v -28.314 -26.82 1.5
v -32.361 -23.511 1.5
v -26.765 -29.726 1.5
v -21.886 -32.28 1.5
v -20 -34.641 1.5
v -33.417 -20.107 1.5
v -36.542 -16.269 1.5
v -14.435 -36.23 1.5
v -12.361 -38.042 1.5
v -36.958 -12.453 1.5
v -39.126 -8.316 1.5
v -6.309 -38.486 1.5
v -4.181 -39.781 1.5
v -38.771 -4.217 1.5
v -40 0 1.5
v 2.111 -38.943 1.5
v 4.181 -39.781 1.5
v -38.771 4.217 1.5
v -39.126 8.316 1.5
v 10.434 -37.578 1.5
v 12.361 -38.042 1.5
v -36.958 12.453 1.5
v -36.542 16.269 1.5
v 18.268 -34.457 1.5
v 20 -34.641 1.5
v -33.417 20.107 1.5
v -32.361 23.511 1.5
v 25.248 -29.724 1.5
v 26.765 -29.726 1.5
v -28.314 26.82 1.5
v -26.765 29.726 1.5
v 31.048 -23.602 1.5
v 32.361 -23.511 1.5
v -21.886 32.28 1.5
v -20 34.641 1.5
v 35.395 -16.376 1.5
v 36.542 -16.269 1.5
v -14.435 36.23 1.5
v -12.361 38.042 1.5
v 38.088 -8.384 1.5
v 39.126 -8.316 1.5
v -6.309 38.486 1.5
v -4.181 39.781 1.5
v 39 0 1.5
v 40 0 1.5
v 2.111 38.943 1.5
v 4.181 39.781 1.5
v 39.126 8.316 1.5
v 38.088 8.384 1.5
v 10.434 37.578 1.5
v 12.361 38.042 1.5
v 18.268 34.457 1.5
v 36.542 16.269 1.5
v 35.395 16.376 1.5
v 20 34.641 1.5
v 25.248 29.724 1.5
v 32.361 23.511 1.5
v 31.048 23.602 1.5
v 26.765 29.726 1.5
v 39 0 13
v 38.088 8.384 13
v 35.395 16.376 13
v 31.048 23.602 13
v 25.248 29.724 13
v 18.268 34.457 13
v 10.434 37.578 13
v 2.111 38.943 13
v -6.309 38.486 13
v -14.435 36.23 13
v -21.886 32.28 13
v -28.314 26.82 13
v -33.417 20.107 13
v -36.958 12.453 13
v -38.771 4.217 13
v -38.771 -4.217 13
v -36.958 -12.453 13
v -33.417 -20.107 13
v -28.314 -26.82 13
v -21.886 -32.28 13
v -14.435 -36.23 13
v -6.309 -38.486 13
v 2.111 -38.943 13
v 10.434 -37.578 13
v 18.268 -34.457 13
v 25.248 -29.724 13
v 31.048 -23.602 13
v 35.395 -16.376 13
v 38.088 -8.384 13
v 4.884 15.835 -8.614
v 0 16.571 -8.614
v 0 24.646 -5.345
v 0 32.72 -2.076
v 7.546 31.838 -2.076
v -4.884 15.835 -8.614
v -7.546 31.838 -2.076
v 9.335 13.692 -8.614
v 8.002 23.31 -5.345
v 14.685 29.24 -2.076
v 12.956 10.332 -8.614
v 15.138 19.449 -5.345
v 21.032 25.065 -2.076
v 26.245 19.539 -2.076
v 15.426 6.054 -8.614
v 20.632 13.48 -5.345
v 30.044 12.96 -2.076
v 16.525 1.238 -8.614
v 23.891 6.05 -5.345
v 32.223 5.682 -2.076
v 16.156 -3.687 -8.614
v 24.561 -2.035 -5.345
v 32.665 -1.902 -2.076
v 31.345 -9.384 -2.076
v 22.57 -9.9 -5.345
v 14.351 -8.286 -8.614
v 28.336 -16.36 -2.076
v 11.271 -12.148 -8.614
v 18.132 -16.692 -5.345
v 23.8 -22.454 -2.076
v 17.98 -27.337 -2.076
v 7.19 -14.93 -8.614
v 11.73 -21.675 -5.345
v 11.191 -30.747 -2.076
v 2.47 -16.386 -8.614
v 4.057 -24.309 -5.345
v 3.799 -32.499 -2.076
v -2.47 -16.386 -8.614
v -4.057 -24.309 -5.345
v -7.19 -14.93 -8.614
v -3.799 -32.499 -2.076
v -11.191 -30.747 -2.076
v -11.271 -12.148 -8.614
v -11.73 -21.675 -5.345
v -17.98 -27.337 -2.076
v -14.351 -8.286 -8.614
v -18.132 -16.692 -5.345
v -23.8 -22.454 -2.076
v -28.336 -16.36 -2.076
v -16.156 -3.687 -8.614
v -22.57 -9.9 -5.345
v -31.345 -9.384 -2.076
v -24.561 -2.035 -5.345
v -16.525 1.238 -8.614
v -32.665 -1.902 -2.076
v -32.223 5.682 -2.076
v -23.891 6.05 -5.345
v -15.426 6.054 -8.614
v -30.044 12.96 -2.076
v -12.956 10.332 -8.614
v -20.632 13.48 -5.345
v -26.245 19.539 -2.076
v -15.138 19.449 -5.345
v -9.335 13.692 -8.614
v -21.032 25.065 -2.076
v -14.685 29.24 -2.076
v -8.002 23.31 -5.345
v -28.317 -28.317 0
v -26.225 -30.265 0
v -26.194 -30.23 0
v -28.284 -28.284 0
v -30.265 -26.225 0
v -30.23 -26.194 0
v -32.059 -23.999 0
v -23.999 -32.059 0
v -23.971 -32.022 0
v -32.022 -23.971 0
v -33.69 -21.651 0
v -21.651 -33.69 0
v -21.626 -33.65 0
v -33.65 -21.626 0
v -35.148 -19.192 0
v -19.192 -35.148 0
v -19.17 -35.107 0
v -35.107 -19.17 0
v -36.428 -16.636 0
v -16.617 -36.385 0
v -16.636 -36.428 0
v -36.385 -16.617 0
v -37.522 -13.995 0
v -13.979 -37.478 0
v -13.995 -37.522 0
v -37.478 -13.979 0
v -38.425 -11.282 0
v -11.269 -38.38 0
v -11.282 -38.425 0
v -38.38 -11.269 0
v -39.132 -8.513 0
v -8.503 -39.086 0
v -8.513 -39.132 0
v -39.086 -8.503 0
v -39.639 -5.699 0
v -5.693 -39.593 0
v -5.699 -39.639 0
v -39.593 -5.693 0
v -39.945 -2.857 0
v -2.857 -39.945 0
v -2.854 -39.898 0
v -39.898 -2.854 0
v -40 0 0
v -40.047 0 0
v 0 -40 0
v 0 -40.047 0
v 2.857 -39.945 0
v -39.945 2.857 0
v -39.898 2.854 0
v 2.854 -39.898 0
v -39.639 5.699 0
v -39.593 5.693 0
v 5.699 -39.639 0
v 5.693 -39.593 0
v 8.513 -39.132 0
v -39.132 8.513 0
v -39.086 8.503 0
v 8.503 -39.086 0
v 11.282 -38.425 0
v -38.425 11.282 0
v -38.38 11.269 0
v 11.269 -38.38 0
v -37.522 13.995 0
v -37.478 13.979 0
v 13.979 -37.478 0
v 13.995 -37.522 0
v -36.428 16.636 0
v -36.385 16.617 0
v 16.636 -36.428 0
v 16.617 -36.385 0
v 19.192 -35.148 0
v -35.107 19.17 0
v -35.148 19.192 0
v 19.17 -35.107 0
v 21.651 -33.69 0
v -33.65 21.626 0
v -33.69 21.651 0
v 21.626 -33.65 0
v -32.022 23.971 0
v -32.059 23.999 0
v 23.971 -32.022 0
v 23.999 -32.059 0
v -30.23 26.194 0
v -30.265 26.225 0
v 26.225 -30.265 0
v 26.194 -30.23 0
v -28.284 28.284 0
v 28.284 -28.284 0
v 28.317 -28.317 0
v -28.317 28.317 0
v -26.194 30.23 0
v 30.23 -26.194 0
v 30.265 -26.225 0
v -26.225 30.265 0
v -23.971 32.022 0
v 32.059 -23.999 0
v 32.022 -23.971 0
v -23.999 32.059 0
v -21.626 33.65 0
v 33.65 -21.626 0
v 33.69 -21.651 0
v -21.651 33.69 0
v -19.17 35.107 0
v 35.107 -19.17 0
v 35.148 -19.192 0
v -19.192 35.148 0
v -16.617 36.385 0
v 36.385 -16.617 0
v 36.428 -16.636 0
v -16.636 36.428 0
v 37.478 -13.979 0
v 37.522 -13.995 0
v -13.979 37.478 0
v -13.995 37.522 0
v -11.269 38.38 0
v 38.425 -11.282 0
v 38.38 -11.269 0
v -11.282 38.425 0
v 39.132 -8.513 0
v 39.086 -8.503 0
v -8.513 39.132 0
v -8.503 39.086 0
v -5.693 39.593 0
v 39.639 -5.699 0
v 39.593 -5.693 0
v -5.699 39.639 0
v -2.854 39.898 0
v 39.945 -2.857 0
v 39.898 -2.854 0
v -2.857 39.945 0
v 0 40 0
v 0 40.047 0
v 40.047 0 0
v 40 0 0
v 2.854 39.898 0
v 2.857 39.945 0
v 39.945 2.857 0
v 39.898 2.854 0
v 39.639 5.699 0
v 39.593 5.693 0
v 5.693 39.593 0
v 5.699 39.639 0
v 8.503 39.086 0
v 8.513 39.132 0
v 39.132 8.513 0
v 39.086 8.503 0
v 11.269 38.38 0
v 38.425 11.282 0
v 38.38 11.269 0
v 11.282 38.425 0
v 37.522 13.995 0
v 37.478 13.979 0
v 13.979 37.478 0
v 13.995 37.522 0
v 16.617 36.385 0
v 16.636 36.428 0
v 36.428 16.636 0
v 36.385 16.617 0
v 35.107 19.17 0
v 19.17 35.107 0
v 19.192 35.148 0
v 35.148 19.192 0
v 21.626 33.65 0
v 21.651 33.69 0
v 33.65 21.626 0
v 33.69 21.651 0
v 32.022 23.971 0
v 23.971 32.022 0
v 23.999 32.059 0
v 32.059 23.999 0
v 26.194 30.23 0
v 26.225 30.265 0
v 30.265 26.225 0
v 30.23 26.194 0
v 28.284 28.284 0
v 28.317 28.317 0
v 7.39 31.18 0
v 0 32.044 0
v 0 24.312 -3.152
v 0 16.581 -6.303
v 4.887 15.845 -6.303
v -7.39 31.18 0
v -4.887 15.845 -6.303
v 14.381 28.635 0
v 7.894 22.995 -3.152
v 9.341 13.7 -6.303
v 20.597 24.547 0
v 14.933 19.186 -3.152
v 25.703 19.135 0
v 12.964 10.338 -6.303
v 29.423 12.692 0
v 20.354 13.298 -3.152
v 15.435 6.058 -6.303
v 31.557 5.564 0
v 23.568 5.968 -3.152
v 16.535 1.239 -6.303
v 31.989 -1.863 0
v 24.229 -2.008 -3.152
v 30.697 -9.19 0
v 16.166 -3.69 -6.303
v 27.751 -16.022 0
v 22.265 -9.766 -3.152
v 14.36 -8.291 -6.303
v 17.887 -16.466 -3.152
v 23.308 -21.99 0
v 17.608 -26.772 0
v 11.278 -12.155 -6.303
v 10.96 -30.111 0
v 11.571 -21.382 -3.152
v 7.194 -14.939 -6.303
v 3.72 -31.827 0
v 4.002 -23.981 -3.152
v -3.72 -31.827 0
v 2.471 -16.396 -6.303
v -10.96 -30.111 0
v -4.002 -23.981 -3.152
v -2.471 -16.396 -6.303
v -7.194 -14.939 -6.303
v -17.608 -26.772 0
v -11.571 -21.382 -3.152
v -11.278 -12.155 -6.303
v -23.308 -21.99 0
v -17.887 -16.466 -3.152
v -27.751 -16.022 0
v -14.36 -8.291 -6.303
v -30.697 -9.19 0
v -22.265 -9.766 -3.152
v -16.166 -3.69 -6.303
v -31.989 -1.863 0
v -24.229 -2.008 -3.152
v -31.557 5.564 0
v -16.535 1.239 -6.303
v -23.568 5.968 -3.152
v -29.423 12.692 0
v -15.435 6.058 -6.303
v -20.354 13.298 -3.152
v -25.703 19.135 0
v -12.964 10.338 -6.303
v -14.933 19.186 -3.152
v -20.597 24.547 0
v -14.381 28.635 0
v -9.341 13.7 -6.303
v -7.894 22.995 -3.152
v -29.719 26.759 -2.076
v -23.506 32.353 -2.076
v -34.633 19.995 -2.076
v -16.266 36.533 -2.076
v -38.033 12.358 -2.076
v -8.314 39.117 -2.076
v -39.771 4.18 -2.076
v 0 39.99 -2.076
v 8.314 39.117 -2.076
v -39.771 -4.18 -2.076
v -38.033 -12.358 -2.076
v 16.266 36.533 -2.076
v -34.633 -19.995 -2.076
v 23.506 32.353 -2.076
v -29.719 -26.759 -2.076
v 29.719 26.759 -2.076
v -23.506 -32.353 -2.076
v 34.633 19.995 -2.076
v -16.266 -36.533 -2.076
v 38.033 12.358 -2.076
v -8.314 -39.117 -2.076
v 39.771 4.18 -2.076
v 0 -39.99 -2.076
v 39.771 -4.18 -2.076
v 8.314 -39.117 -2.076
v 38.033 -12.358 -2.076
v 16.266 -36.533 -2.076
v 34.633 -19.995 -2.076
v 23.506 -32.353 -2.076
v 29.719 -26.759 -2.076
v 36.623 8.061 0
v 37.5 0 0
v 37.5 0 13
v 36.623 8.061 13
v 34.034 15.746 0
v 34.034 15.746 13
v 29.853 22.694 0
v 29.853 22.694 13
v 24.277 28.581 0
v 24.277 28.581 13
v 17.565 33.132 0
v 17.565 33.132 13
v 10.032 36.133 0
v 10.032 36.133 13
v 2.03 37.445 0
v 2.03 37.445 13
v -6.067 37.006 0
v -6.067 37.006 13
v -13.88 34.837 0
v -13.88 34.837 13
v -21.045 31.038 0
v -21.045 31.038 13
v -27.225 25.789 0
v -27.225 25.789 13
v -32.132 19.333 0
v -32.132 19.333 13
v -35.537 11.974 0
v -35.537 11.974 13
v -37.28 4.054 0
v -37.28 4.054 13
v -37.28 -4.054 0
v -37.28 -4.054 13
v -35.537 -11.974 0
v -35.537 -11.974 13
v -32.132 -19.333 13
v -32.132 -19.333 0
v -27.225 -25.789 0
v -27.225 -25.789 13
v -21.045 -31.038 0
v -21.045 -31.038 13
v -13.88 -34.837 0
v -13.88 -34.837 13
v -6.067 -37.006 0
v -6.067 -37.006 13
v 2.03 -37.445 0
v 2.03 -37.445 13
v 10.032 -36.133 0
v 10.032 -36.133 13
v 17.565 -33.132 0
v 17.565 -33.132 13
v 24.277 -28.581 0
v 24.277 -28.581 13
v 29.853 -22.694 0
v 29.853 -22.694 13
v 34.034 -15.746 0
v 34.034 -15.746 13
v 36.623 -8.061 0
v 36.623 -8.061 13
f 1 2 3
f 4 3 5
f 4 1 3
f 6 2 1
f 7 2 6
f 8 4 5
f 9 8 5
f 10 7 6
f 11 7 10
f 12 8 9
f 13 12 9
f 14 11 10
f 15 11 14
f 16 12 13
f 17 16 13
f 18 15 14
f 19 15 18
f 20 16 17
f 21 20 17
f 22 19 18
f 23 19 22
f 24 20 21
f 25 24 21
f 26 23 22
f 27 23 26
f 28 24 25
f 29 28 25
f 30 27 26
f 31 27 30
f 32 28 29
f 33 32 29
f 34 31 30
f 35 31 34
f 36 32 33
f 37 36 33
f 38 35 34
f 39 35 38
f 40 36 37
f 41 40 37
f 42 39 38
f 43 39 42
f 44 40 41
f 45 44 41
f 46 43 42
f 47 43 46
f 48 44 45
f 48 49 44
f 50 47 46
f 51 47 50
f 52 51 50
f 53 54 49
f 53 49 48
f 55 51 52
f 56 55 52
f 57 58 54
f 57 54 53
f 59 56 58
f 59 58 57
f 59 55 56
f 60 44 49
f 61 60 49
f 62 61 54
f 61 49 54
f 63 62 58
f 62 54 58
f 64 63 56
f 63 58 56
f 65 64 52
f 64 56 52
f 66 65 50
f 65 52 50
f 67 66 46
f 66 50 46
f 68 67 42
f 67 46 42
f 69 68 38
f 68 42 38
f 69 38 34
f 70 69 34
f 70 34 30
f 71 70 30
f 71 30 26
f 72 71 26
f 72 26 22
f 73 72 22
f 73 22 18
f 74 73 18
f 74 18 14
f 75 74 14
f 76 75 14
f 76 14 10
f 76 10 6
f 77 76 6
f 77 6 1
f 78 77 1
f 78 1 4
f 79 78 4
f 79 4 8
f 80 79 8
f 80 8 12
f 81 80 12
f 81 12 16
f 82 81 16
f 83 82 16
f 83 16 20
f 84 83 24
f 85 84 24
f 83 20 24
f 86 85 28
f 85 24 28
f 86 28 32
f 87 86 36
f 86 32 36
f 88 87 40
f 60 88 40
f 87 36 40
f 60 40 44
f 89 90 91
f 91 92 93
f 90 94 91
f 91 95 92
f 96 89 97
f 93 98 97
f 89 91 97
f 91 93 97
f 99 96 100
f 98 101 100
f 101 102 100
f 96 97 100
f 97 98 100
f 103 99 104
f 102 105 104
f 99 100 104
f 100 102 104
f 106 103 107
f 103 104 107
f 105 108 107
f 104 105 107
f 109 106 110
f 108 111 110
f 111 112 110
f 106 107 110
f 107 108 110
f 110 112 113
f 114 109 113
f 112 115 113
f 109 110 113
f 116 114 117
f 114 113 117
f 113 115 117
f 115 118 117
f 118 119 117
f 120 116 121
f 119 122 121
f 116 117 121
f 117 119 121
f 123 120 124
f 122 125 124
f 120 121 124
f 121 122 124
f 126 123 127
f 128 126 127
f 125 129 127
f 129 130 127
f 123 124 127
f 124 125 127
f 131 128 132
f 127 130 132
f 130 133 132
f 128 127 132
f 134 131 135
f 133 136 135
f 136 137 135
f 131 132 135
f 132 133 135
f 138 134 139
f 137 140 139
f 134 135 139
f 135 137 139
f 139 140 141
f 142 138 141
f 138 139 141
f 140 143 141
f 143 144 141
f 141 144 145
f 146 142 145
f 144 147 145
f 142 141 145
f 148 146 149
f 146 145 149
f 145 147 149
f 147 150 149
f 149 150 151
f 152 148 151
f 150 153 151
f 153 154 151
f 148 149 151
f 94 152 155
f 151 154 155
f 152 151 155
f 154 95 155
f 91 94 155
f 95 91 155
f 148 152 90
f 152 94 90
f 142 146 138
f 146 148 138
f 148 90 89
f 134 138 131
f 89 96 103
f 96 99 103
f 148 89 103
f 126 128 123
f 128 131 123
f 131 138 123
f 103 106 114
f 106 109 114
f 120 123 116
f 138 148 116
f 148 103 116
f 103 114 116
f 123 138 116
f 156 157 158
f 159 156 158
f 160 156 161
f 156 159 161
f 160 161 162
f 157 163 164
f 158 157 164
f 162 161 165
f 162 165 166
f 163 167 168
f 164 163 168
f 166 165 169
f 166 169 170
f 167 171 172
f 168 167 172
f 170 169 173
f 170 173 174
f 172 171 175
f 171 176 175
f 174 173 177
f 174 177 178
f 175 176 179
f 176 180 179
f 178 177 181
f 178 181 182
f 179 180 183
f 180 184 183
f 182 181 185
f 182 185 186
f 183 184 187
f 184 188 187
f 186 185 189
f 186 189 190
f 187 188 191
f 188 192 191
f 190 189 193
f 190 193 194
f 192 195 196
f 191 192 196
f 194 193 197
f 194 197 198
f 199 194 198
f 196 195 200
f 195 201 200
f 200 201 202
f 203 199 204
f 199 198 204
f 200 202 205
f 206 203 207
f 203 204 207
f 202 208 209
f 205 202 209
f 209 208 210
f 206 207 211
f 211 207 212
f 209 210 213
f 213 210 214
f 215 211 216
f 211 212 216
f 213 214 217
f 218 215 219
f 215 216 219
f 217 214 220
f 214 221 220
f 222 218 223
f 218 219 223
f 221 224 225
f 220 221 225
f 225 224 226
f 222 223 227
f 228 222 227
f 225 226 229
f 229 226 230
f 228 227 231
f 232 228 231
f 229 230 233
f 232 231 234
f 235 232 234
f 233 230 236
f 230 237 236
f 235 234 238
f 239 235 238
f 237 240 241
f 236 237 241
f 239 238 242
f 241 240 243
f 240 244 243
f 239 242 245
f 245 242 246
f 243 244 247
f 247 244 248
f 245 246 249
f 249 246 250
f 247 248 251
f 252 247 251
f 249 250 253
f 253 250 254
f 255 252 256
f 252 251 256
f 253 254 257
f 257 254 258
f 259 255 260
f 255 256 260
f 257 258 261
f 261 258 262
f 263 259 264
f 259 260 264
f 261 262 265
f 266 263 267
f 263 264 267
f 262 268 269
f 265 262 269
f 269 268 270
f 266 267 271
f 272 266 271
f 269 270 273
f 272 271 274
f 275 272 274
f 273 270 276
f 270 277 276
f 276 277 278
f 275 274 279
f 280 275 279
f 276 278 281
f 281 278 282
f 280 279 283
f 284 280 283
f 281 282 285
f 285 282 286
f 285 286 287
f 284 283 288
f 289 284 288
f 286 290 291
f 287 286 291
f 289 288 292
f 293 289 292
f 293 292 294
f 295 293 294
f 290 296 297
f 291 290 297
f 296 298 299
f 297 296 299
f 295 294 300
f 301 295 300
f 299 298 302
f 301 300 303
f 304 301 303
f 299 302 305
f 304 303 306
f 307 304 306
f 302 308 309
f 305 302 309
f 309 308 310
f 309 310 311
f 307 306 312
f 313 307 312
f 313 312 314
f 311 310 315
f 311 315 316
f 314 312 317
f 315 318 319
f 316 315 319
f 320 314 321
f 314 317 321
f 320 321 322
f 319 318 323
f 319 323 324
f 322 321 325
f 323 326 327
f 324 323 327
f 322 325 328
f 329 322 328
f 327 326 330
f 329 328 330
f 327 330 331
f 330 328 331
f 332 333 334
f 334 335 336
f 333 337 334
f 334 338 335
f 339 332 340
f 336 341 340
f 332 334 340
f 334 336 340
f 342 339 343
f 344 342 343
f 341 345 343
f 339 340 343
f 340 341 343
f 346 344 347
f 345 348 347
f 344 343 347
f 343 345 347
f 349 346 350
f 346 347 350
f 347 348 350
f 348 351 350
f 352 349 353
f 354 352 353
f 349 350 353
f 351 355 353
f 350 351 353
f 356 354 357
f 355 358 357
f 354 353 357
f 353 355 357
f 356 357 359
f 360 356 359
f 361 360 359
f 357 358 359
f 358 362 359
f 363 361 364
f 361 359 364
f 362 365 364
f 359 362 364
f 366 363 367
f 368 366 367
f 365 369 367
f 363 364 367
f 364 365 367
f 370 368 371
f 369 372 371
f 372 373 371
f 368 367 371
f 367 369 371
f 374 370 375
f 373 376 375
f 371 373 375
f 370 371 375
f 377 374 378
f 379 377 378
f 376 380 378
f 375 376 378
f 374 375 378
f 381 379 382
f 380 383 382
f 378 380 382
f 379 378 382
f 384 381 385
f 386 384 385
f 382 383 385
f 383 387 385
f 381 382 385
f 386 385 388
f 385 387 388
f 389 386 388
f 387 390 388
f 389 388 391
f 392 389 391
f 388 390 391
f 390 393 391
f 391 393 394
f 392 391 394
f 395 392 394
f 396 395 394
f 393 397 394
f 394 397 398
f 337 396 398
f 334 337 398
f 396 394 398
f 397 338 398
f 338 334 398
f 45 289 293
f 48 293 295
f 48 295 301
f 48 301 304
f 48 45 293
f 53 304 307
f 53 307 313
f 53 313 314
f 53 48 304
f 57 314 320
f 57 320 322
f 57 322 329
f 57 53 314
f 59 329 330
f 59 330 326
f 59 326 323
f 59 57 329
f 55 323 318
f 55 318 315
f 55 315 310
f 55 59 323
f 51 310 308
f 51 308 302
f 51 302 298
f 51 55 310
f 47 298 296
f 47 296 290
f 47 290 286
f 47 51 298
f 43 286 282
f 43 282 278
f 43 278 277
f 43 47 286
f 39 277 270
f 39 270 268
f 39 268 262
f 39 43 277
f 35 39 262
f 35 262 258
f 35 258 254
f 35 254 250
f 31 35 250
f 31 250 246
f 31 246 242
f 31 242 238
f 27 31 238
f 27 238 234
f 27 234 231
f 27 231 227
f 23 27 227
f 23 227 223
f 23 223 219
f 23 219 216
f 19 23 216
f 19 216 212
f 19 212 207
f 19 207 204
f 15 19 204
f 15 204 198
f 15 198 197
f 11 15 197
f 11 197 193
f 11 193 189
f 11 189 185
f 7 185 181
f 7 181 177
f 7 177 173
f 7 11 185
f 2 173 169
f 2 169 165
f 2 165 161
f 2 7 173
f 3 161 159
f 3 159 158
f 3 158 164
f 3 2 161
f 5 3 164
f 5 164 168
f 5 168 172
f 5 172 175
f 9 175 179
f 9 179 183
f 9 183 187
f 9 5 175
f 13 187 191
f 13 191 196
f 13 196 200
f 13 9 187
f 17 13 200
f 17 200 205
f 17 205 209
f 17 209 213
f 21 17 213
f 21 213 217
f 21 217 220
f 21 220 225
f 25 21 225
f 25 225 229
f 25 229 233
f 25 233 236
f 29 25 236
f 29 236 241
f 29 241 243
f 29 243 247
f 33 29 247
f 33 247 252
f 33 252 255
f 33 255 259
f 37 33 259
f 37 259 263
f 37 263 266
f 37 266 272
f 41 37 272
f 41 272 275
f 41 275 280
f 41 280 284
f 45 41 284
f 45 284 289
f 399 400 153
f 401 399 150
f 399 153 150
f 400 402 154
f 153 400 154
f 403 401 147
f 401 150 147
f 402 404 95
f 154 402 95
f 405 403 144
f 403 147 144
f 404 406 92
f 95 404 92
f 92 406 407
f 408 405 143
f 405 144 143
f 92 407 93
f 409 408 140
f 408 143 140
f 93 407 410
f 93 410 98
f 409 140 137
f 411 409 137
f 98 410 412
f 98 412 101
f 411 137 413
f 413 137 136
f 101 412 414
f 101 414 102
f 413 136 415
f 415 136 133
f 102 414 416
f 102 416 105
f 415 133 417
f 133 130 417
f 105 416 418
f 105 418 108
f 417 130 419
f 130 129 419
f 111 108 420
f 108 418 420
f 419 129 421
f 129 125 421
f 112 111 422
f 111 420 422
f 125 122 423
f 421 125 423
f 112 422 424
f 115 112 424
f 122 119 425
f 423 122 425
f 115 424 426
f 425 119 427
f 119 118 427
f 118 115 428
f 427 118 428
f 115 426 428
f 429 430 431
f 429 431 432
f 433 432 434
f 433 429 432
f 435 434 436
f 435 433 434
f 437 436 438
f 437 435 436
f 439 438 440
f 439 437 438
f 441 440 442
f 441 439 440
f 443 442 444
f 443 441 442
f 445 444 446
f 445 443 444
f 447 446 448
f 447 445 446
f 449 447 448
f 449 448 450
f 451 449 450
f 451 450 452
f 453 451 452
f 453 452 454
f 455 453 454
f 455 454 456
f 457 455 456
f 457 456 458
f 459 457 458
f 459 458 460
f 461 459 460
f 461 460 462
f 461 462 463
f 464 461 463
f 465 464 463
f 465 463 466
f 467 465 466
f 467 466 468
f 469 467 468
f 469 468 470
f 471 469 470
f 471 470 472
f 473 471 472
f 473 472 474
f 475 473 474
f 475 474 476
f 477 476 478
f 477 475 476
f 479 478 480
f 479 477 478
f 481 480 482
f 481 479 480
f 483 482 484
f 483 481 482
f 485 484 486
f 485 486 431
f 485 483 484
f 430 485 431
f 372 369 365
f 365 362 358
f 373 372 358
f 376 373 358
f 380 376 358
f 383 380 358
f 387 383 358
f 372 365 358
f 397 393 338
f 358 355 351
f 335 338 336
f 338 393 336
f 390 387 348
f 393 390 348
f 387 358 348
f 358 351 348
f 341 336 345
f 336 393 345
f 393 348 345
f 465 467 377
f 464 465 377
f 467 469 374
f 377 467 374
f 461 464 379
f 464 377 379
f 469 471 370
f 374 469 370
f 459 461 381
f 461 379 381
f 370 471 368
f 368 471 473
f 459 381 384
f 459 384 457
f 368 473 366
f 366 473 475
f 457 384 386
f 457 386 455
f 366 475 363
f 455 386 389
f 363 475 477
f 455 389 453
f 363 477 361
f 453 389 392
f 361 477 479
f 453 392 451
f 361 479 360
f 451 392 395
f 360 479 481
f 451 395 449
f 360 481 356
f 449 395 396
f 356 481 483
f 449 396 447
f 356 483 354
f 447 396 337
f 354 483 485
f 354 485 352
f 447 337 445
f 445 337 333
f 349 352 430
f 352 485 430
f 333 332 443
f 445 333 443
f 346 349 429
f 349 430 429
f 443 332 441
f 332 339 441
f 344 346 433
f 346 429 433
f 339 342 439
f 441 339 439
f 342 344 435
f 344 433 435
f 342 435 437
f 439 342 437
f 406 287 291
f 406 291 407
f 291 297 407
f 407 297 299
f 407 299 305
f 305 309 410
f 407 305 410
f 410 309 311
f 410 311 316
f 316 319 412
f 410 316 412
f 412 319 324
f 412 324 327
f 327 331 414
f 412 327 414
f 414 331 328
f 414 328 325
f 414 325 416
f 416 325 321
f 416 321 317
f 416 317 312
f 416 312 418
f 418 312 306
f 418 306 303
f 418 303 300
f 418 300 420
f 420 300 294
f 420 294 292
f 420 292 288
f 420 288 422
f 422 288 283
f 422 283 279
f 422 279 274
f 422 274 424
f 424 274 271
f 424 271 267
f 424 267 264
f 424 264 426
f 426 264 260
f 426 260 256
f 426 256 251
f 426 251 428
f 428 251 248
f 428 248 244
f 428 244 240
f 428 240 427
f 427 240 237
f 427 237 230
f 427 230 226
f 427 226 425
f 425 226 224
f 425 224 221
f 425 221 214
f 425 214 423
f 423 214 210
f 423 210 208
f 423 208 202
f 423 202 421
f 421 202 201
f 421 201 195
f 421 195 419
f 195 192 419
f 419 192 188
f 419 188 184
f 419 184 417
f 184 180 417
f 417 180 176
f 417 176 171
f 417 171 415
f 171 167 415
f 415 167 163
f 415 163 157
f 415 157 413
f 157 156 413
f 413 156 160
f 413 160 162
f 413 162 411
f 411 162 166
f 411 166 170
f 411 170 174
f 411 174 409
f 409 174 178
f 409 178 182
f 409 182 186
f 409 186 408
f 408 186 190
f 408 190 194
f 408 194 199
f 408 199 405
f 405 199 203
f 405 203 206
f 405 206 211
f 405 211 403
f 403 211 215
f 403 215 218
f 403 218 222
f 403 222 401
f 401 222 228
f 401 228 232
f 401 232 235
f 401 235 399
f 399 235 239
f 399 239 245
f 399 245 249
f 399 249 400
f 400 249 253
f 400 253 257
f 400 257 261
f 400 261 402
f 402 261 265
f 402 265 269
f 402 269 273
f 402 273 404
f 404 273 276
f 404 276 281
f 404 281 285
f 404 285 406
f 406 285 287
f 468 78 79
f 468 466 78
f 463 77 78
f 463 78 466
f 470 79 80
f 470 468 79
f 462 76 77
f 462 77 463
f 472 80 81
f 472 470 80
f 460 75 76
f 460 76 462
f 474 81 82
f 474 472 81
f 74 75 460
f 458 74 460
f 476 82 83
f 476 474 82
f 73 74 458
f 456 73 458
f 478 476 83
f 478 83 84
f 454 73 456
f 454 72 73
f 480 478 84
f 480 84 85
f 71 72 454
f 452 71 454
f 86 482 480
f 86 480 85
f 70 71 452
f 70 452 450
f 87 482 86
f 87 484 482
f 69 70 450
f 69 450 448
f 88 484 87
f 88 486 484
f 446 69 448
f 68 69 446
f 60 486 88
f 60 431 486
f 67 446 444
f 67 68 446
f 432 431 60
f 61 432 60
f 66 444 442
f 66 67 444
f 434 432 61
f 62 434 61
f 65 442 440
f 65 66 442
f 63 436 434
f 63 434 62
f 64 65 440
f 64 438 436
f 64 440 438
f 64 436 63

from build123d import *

# Parameters (mm, degrees)
F0_R     = 39
F0_R_2   = 37.5
F1_DEPTH = 13
F2_R     = 40
F2_R_2   = 37.5
F3_DEPTH = 1.5


with BuildPart() as f1:
    # F0 (on Top) → F1 (new body)
    with BuildSketch(Plane.XY):
        Circle(F0_R)
        Circle(F0_R_2, mode=Mode.SUBTRACT)
    extrude(amount=F1_DEPTH)

    # F2 (on Top) → F3 (join, symmetric)
    with BuildSketch(Plane.XY):
        Circle(F2_R)
        Circle(F2_R_2, mode=Mode.SUBTRACT)
    extrude(amount=F3_DEPTH, both=True)

    # F4 (on Right) → F5 (revolve)
    with BuildSketch(Plane.YZ):
        Polygon((39.990474, -2.075957), (40.046833, 0), (32.043573, 0), (16.581262, -6.303032), (0, -6.303032), (0, -8.613833), (16.571351, -8.613833), (32.719906, -2.075957), align=None)
    revolve(axis=Axis((0, 0, -7.458432), (0, 0, -1)))


solid = f1.part
